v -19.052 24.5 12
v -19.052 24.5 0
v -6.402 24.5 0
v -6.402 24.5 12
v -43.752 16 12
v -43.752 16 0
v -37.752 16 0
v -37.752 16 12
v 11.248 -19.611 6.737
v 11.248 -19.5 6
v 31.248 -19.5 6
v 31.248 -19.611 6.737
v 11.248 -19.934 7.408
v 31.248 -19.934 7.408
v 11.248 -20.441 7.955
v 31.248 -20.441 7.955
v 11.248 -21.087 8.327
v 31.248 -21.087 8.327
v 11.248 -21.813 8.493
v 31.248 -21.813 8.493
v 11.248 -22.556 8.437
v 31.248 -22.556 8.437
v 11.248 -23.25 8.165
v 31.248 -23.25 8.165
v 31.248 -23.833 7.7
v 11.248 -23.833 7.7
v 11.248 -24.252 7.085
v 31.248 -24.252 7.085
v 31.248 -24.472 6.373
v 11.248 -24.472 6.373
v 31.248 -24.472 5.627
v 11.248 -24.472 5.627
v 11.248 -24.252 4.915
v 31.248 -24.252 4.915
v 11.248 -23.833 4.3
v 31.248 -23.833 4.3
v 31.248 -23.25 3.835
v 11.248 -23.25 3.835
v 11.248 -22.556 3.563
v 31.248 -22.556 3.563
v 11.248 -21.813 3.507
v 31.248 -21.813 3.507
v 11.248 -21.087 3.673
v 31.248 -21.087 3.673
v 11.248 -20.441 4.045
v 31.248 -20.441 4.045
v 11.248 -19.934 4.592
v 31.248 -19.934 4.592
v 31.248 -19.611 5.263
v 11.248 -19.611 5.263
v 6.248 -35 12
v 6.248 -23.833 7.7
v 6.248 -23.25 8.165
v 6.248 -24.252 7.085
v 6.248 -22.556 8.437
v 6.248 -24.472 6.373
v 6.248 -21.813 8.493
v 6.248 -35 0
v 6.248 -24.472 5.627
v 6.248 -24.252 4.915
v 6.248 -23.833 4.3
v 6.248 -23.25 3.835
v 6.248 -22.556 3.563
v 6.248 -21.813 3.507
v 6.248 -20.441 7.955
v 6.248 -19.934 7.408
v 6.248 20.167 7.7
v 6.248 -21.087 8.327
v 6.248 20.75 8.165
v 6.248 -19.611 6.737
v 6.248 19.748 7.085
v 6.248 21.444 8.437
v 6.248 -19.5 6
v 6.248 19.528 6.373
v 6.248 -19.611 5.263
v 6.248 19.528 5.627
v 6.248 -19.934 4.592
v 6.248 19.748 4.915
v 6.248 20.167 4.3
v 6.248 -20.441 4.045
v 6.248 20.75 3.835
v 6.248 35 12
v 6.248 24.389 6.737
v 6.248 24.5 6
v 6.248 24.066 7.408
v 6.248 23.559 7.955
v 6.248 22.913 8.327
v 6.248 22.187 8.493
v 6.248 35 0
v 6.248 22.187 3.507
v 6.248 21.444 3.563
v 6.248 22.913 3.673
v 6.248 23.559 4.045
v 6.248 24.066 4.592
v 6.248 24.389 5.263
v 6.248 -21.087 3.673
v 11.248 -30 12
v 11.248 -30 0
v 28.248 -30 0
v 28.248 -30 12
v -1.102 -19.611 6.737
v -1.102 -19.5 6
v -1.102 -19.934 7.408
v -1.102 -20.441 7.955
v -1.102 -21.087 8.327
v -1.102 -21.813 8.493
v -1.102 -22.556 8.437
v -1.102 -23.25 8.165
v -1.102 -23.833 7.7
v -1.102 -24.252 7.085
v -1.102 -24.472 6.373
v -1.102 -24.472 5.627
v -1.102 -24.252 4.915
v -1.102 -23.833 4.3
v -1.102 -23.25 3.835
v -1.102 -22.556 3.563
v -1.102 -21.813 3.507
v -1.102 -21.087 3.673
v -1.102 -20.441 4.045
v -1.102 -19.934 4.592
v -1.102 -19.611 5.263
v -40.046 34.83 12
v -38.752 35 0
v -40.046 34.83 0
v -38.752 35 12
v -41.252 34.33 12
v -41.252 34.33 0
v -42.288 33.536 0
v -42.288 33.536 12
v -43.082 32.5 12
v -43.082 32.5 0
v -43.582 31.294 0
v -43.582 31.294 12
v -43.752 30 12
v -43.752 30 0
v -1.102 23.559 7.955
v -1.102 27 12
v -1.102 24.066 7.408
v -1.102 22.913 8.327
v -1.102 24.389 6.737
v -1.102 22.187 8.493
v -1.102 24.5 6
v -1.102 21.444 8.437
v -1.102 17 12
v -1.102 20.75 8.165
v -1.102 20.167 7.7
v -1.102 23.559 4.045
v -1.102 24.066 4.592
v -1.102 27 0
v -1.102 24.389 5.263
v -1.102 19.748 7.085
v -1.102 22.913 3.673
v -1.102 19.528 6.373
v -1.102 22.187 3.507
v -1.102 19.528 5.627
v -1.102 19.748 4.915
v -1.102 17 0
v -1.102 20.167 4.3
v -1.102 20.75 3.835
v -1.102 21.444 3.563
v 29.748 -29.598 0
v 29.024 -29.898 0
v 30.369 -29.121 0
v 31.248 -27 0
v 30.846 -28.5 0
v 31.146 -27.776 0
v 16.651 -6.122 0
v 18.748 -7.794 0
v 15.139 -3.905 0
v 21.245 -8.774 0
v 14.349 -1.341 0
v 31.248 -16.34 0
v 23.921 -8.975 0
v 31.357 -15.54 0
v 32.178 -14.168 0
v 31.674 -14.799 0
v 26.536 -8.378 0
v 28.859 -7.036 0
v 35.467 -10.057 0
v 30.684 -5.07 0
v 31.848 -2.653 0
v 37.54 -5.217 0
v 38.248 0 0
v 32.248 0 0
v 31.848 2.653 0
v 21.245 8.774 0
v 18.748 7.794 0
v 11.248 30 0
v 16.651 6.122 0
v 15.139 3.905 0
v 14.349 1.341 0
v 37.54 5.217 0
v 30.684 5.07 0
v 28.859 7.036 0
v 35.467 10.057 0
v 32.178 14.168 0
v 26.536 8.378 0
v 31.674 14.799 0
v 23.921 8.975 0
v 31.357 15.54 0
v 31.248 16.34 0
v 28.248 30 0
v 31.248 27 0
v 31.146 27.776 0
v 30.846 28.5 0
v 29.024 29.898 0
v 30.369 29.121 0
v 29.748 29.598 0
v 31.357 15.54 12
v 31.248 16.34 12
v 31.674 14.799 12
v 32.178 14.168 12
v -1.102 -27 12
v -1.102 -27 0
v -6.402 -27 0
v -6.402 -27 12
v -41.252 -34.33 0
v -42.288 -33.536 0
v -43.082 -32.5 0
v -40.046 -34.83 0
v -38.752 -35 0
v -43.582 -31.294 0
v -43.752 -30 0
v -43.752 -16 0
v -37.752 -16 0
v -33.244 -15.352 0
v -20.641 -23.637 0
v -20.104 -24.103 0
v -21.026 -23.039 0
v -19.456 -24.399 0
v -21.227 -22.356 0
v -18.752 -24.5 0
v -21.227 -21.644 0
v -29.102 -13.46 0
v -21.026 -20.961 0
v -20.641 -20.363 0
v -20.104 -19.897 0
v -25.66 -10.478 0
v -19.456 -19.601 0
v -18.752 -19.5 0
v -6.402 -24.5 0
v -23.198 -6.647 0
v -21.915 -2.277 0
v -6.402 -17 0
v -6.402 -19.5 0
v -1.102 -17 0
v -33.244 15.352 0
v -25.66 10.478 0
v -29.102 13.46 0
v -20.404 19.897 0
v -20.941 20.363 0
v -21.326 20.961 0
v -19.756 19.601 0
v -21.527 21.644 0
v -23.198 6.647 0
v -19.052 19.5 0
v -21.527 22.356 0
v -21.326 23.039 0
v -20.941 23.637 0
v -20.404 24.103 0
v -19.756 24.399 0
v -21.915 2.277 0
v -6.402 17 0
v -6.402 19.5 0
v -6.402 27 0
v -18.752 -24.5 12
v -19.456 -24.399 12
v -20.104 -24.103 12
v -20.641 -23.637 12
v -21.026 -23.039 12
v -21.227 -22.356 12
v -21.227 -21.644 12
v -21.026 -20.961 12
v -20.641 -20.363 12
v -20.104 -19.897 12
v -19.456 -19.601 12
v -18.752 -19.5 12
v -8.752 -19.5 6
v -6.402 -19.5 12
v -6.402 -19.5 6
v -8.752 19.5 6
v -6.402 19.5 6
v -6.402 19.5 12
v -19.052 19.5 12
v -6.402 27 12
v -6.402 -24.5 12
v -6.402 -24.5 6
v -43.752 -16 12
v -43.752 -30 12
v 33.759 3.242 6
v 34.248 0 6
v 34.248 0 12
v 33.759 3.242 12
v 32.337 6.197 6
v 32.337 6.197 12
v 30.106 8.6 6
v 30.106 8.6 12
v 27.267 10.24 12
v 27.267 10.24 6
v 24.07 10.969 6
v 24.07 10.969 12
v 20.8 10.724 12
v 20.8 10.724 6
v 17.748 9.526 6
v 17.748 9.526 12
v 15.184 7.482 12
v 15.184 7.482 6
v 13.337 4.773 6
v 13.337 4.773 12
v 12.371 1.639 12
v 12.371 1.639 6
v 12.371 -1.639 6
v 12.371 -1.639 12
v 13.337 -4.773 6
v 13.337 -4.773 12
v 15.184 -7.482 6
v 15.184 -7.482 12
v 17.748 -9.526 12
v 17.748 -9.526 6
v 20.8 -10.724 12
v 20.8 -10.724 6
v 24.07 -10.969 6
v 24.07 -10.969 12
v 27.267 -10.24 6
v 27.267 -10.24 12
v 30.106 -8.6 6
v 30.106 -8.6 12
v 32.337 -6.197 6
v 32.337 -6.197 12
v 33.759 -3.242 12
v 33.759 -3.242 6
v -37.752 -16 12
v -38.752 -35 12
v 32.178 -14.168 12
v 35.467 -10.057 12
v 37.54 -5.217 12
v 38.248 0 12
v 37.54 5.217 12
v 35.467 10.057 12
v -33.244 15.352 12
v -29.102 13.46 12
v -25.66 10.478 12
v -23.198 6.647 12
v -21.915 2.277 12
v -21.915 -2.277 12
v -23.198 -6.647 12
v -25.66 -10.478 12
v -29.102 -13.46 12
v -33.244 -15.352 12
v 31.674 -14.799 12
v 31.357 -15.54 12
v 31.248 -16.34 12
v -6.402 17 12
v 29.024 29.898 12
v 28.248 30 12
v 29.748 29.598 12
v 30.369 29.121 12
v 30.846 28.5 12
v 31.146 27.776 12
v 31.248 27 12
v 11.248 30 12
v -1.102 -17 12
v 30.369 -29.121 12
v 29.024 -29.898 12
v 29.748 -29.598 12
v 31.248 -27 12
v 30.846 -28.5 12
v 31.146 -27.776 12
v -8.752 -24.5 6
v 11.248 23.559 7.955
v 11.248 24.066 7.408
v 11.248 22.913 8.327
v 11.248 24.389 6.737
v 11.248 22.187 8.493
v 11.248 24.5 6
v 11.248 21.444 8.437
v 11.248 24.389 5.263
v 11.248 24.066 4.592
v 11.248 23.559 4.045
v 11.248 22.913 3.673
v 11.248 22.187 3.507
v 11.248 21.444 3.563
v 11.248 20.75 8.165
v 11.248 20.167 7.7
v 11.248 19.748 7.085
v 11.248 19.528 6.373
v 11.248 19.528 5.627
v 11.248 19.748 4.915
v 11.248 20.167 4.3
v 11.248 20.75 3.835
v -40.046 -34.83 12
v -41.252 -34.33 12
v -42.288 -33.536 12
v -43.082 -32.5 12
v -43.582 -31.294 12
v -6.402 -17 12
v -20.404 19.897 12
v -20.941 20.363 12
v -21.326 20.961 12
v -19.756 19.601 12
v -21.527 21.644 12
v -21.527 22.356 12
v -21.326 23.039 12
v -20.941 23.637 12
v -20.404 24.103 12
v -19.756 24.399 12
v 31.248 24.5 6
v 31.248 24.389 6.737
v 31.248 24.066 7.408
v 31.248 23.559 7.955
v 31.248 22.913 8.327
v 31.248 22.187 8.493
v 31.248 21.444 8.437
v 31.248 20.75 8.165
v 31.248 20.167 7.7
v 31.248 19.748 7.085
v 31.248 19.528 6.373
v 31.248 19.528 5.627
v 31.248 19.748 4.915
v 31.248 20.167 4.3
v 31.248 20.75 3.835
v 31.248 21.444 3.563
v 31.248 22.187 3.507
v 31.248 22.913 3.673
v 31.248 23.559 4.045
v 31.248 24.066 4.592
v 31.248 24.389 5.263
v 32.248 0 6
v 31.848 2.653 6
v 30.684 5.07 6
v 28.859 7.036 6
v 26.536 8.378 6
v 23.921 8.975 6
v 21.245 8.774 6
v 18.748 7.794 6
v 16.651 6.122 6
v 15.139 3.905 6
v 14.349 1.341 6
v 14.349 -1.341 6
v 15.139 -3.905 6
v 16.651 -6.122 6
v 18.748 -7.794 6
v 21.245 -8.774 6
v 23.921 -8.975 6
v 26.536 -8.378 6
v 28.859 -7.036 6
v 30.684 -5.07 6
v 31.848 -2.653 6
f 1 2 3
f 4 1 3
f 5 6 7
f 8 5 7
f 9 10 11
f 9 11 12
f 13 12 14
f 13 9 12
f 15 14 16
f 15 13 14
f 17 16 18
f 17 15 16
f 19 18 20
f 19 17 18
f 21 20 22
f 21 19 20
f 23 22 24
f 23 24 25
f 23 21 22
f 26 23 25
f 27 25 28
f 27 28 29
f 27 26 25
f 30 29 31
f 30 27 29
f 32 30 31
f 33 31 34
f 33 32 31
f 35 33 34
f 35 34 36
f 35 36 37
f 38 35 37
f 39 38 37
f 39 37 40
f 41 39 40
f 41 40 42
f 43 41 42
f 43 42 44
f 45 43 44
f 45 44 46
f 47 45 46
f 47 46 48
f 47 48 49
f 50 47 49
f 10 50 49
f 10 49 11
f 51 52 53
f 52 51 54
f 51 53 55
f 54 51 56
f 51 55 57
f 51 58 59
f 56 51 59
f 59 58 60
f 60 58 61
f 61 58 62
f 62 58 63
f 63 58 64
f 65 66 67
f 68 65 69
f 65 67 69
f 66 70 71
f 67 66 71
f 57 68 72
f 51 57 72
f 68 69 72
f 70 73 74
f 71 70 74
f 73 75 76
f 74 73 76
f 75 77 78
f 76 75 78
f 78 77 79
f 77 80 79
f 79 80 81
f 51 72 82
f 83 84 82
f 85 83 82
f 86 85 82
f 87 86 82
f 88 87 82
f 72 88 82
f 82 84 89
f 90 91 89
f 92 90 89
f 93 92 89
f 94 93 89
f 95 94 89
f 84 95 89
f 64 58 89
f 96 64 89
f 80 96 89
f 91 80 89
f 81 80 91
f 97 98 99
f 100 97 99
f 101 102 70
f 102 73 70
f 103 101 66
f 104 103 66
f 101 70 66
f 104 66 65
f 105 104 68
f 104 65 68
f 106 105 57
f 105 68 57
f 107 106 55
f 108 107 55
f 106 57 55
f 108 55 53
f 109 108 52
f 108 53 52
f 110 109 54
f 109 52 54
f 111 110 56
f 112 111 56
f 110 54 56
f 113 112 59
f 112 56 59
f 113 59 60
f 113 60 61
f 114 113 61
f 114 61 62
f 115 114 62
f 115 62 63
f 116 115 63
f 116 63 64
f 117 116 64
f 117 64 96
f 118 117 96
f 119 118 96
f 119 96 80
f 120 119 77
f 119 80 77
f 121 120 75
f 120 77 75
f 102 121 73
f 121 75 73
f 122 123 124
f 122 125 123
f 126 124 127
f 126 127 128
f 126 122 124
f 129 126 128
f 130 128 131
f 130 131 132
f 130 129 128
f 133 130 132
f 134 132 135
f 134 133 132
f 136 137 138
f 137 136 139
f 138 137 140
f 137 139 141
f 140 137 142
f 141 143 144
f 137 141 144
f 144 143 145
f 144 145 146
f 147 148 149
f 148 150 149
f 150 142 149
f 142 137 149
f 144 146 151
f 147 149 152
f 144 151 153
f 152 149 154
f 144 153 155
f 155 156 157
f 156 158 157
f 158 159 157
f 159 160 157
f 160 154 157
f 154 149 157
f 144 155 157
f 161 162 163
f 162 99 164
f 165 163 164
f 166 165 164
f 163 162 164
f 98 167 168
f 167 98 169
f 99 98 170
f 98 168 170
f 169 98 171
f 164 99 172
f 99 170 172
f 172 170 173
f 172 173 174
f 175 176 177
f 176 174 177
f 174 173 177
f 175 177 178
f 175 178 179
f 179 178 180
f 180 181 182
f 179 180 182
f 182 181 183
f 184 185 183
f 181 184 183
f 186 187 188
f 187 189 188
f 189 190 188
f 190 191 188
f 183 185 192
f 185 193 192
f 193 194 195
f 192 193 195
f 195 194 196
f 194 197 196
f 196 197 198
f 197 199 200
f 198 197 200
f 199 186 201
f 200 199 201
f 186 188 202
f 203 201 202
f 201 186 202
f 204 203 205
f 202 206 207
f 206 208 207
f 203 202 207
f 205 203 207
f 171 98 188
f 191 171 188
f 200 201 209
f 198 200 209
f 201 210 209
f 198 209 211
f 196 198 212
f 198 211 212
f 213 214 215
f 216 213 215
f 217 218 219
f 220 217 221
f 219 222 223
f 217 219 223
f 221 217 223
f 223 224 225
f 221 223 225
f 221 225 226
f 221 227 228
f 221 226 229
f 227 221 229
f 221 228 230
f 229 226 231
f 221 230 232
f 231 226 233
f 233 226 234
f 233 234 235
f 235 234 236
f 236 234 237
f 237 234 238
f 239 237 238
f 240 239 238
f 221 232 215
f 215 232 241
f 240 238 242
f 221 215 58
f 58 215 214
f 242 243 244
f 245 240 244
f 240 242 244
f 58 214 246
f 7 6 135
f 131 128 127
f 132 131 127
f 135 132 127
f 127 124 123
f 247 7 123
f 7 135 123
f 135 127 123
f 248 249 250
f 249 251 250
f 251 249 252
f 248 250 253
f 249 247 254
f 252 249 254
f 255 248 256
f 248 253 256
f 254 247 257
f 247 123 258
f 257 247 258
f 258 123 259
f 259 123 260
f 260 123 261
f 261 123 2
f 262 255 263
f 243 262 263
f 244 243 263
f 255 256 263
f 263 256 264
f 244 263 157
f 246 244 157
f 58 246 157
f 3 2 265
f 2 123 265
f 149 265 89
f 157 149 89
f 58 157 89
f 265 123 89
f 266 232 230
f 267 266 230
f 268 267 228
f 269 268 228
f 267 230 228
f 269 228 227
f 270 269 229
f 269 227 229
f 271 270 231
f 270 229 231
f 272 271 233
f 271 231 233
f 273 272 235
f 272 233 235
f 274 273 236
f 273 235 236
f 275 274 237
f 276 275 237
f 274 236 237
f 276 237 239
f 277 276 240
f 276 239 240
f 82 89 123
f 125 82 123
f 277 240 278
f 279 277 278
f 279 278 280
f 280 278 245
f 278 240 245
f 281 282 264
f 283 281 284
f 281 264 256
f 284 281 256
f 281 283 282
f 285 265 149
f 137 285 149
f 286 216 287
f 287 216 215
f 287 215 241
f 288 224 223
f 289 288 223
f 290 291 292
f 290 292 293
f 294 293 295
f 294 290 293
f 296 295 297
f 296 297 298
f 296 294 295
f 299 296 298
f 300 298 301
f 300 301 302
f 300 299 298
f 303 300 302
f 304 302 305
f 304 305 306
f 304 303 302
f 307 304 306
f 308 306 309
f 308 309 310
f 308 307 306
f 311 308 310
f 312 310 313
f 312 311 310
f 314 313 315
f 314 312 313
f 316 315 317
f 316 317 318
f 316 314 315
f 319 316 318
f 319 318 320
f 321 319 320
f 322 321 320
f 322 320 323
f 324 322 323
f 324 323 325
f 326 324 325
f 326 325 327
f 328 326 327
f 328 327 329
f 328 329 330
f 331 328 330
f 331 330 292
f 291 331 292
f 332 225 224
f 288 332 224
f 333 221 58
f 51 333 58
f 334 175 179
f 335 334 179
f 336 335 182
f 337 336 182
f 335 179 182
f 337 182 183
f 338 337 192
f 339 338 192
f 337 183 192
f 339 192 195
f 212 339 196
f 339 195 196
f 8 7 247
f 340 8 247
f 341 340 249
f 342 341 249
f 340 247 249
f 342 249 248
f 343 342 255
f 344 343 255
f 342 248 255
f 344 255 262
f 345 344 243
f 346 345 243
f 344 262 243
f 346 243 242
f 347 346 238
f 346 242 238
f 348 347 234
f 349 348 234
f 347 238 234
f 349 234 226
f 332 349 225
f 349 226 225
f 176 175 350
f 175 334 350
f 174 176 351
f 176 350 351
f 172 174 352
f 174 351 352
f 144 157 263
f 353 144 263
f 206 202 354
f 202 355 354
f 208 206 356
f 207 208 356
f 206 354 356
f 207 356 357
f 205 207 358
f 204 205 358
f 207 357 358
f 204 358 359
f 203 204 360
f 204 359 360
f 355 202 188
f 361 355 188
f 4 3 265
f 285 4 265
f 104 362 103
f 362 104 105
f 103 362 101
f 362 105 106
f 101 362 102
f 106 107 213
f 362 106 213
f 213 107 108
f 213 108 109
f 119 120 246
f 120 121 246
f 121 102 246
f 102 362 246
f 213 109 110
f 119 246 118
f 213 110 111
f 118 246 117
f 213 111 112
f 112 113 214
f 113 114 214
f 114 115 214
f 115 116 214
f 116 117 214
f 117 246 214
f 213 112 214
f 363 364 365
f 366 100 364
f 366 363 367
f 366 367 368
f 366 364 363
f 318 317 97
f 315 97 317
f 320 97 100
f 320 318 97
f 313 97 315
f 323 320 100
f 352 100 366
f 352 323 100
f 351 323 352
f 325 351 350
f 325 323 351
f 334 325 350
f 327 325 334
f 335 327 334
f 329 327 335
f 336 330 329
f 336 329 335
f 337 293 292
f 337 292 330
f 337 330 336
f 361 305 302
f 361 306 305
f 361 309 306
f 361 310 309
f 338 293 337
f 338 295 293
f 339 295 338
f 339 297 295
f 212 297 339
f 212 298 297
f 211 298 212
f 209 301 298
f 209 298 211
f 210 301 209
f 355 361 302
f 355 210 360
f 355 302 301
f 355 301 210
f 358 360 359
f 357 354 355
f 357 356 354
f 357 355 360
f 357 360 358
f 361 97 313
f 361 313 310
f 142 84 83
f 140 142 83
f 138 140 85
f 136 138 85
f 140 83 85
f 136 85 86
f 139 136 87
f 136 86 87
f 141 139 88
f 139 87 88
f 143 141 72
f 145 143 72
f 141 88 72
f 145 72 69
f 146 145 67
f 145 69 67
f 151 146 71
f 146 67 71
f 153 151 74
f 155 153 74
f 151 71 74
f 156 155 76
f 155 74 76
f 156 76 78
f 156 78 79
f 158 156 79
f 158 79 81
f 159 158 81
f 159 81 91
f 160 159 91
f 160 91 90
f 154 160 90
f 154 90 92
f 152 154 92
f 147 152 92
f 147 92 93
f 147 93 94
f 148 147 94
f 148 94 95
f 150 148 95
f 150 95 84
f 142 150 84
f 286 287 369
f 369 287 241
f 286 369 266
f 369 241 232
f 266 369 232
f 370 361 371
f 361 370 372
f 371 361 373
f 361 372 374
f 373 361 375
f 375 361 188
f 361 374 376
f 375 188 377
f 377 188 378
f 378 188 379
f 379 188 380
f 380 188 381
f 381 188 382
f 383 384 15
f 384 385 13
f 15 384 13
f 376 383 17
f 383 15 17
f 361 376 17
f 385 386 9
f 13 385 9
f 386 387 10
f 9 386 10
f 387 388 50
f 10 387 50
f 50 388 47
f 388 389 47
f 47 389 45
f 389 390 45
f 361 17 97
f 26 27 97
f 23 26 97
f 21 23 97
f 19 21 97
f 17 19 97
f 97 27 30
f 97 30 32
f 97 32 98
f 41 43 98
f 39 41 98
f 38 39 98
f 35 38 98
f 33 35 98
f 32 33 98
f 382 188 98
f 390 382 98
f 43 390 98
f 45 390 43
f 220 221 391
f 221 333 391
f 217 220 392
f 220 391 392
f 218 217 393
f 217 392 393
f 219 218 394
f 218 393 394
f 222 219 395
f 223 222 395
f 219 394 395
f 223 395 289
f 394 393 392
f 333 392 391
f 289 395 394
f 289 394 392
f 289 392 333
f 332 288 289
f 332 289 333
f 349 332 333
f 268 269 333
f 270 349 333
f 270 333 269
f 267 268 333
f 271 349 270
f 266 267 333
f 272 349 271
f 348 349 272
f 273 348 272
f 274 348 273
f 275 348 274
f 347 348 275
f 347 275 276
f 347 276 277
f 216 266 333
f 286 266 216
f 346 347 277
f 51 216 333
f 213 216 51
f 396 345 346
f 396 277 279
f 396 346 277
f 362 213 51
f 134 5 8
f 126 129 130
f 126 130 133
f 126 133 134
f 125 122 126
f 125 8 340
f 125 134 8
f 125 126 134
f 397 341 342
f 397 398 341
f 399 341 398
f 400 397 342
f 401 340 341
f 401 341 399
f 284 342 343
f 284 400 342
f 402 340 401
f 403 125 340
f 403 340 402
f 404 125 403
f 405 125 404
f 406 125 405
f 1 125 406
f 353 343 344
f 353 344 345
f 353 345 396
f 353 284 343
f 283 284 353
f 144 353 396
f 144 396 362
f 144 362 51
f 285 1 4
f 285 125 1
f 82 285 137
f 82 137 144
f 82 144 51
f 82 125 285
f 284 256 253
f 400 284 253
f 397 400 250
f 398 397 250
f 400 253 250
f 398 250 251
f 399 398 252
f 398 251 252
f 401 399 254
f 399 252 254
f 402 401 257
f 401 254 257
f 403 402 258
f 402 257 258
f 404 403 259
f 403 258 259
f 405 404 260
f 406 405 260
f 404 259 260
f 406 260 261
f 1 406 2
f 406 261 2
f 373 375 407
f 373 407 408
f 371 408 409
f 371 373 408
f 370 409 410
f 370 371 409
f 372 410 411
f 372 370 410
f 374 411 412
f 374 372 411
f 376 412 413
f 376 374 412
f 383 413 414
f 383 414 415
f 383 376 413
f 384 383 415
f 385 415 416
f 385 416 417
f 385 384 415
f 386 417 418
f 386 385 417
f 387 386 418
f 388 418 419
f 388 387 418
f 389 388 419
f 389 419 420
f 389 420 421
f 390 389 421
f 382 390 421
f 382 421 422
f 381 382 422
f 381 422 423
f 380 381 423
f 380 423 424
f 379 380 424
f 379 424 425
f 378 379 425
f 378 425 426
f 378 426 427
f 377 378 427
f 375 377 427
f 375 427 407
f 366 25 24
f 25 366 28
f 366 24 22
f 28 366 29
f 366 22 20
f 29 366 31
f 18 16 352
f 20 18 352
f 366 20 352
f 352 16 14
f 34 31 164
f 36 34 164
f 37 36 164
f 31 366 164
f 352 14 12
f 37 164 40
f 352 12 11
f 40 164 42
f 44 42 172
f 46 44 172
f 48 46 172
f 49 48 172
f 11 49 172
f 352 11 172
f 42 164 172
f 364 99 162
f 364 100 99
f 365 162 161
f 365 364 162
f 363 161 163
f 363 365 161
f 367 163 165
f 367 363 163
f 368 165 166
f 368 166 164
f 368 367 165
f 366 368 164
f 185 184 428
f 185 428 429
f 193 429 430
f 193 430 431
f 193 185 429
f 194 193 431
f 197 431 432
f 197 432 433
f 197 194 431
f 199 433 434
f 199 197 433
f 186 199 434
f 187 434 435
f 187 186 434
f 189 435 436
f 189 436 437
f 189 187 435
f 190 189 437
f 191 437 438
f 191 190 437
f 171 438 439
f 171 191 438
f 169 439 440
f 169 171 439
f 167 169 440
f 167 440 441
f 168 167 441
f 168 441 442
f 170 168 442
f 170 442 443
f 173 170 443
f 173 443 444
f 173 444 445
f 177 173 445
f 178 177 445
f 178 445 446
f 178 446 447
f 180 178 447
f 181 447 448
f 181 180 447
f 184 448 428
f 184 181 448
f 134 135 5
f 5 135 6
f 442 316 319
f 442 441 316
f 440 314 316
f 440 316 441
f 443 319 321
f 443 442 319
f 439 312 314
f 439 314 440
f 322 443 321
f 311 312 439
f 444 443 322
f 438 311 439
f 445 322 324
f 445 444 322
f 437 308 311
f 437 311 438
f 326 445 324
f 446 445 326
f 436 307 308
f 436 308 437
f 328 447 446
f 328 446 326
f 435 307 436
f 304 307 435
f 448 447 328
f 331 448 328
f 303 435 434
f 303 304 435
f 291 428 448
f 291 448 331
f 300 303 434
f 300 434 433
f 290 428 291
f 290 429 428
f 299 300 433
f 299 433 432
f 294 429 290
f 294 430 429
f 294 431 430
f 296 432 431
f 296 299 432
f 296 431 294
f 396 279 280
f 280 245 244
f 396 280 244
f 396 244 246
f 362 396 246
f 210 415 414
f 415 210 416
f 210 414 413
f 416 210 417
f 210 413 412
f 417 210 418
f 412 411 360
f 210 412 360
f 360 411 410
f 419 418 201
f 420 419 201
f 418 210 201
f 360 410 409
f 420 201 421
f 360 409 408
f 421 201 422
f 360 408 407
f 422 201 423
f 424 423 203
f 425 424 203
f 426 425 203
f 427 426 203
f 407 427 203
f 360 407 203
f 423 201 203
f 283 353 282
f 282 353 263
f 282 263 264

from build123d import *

# Parameters (mm, degrees)
F1_DEPTH  = 12
F2_R      = 2.5
F3_DEPTH  = 15
F4_R      = 5
F5_R      = 11
F6_DEPTH  = 12
F5_R_2    = 9
F7_DEPTH  = 6
F8_R      = 3
F6_FACE_W = 10.6598653616
F6_FACE_H = 12
F9_DEPTH  = 25


# Not quite as in the source:
# - a feature names something its author has since deleted; it is built from what else it names


with BuildPart() as f1:
    # F0 (on Top) → F1 (new body)
    with BuildSketch(Plane.XY):
        with BuildLine():
            Line((6.2480168641, -35), (6.2480168641, 0))
            Line((6.2480168641, 0), (6.2480168641, 35))
            Line((6.2480168641, 35), (-43.7519831359, 35))
            Line((-43.7519831359, 35), (-43.7519831359, 16))
            Line((-43.7519831359, 16), (-37.7519831359, 16))
            ThreePointArc((-37.7519831359, 16), (-21.7519831359, 0), (-37.7519831359, -16))
            Line((-37.7519831359, -16), (-43.7519831359, -16))
            Line((-43.7519831359, -16), (-43.7519831359, -35))
            Line((-43.7519831359, -35), (6.2480168641, -35))
        make_face()
        with BuildLine():
            ThreePointArc((-18.7519831359, -24.5), (-21.2519831359, -22), (-18.7519831359, -19.5))
            Line((-18.7519831359, -19.5), (-6.4019831359, -19.5))
            Line((-6.4019831359, -19.5), (-6.4019831359, -17))
            Line((-6.4019831359, -17), (-1.1019831359, -17))
            Line((-1.1019831359, -17), (-1.1019831359, -27))
            Line((-1.1019831359, -27), (-6.4019831359, -27))
            Line((-6.4019831359, -27), (-6.4019831359, -24.5))
            Line((-6.4019831359, -24.5), (-18.7519831359, -24.5))
        make_face(mode=Mode.SUBTRACT)
        with BuildLine():
            ThreePointArc((-19.0519835278, 19.4999995902), (-21.5519835278, 21.9999995902), (-19.0519835278, 24.4999995902))
            Line((-19.0519835278, 24.4999995902), (-6.4019831359, 24.500000484))
            Line((-6.4019831359, 24.500000484), (-6.4019831359, 27))
            Line((-6.4019831359, 27), (-1.1019831359, 27))
            Line((-1.1019831359, 27), (-1.1019831359, 17))
            Line((-1.1019831359, 17), (-6.4019831359, 17))
            Line((-6.4019831359, 17), (-6.4019831359, 19.500000484))
            Line((-6.4019831359, 19.500000484), (-19.0519835278, 19.4999995902))
        make_face(mode=Mode.SUBTRACT)
    extrude(amount=F1_DEPTH)

    # F2 (on face) → F3 (cut)
    with BuildSketch(Plane.YZ.offset(6.2480168641)):
        with Locations((-22, 6)):
            Circle(F2_R)
        with Locations((22, 6)):
            Circle(F2_R)
    extrude(amount=-F3_DEPTH, mode=Mode.SUBTRACT)

    # F4
    f4_edges = [f1.edges().sort_by_distance(p)[0] for p in [
        (-43.751983, 35, 6),
        (-43.751983, -35, 6),
    ]]
    fillet(f4_edges, radius=F4_R)


with BuildPart() as f6:
    # F5 (on Top) → F6 (new body)
    with BuildSketch(Plane.XY):
        with BuildLine():
            Line((31.2480168641, 30), (11.2480168641, 30))
            Line((11.2480168641, 30), (11.2480168641, -30))
            Line((11.2480168641, -30), (31.2480168641, -30))
            Line((31.2480168641, -30), (31.2480168641, -15))
            ThreePointArc((31.2480168641, -15), (38.2480168641, 0), (31.2480168641, 15))
            Line((31.2480168641, 15), (31.2480168641, 30))
        make_face()
        with Locations((23.2480168641, 0)):
            Circle(F5_R, mode=Mode.SUBTRACT)
    extrude(amount=F6_DEPTH)

    # F5 (on Top) → F7 (join)
    with BuildSketch(Plane.XY):
        with Locations((23.2480168641, 0)):
            Circle(F5_R)
        with Locations((23.2480168641, 0)):
            Circle(F5_R_2, mode=Mode.SUBTRACT)
    extrude(amount=F7_DEPTH)

    # F8
    f8_edges = [f6.edges().sort_by_distance(p)[0] for p in [
        (31.248017, 30, 6),
        (31.248017, -30, 6),
        (31.248017, 15, 6),
        (31.248017, -15, 6),
    ]]
    fillet(f8_edges, radius=F8_R)

    # F2 (on face) + F6_face (on face) → F9 (cut)
    with BuildSketch(Plane.YZ.offset(6.2480168641)):
        with Locations((-22, 6)):
            Circle(F2_R)
        with Locations((22, 6)):
            Circle(F2_R)
    with BuildSketch(Plane(origin=(31.2480168641, 21.6700673192, 6), x_dir=(0, 1, 0), z_dir=(1, 0, 0))):
        Rectangle(F6_FACE_W, F6_FACE_H)
    extrude(amount=F9_DEPTH, mode=Mode.SUBTRACT)


solid = Compound([f1.part, f6.part])
